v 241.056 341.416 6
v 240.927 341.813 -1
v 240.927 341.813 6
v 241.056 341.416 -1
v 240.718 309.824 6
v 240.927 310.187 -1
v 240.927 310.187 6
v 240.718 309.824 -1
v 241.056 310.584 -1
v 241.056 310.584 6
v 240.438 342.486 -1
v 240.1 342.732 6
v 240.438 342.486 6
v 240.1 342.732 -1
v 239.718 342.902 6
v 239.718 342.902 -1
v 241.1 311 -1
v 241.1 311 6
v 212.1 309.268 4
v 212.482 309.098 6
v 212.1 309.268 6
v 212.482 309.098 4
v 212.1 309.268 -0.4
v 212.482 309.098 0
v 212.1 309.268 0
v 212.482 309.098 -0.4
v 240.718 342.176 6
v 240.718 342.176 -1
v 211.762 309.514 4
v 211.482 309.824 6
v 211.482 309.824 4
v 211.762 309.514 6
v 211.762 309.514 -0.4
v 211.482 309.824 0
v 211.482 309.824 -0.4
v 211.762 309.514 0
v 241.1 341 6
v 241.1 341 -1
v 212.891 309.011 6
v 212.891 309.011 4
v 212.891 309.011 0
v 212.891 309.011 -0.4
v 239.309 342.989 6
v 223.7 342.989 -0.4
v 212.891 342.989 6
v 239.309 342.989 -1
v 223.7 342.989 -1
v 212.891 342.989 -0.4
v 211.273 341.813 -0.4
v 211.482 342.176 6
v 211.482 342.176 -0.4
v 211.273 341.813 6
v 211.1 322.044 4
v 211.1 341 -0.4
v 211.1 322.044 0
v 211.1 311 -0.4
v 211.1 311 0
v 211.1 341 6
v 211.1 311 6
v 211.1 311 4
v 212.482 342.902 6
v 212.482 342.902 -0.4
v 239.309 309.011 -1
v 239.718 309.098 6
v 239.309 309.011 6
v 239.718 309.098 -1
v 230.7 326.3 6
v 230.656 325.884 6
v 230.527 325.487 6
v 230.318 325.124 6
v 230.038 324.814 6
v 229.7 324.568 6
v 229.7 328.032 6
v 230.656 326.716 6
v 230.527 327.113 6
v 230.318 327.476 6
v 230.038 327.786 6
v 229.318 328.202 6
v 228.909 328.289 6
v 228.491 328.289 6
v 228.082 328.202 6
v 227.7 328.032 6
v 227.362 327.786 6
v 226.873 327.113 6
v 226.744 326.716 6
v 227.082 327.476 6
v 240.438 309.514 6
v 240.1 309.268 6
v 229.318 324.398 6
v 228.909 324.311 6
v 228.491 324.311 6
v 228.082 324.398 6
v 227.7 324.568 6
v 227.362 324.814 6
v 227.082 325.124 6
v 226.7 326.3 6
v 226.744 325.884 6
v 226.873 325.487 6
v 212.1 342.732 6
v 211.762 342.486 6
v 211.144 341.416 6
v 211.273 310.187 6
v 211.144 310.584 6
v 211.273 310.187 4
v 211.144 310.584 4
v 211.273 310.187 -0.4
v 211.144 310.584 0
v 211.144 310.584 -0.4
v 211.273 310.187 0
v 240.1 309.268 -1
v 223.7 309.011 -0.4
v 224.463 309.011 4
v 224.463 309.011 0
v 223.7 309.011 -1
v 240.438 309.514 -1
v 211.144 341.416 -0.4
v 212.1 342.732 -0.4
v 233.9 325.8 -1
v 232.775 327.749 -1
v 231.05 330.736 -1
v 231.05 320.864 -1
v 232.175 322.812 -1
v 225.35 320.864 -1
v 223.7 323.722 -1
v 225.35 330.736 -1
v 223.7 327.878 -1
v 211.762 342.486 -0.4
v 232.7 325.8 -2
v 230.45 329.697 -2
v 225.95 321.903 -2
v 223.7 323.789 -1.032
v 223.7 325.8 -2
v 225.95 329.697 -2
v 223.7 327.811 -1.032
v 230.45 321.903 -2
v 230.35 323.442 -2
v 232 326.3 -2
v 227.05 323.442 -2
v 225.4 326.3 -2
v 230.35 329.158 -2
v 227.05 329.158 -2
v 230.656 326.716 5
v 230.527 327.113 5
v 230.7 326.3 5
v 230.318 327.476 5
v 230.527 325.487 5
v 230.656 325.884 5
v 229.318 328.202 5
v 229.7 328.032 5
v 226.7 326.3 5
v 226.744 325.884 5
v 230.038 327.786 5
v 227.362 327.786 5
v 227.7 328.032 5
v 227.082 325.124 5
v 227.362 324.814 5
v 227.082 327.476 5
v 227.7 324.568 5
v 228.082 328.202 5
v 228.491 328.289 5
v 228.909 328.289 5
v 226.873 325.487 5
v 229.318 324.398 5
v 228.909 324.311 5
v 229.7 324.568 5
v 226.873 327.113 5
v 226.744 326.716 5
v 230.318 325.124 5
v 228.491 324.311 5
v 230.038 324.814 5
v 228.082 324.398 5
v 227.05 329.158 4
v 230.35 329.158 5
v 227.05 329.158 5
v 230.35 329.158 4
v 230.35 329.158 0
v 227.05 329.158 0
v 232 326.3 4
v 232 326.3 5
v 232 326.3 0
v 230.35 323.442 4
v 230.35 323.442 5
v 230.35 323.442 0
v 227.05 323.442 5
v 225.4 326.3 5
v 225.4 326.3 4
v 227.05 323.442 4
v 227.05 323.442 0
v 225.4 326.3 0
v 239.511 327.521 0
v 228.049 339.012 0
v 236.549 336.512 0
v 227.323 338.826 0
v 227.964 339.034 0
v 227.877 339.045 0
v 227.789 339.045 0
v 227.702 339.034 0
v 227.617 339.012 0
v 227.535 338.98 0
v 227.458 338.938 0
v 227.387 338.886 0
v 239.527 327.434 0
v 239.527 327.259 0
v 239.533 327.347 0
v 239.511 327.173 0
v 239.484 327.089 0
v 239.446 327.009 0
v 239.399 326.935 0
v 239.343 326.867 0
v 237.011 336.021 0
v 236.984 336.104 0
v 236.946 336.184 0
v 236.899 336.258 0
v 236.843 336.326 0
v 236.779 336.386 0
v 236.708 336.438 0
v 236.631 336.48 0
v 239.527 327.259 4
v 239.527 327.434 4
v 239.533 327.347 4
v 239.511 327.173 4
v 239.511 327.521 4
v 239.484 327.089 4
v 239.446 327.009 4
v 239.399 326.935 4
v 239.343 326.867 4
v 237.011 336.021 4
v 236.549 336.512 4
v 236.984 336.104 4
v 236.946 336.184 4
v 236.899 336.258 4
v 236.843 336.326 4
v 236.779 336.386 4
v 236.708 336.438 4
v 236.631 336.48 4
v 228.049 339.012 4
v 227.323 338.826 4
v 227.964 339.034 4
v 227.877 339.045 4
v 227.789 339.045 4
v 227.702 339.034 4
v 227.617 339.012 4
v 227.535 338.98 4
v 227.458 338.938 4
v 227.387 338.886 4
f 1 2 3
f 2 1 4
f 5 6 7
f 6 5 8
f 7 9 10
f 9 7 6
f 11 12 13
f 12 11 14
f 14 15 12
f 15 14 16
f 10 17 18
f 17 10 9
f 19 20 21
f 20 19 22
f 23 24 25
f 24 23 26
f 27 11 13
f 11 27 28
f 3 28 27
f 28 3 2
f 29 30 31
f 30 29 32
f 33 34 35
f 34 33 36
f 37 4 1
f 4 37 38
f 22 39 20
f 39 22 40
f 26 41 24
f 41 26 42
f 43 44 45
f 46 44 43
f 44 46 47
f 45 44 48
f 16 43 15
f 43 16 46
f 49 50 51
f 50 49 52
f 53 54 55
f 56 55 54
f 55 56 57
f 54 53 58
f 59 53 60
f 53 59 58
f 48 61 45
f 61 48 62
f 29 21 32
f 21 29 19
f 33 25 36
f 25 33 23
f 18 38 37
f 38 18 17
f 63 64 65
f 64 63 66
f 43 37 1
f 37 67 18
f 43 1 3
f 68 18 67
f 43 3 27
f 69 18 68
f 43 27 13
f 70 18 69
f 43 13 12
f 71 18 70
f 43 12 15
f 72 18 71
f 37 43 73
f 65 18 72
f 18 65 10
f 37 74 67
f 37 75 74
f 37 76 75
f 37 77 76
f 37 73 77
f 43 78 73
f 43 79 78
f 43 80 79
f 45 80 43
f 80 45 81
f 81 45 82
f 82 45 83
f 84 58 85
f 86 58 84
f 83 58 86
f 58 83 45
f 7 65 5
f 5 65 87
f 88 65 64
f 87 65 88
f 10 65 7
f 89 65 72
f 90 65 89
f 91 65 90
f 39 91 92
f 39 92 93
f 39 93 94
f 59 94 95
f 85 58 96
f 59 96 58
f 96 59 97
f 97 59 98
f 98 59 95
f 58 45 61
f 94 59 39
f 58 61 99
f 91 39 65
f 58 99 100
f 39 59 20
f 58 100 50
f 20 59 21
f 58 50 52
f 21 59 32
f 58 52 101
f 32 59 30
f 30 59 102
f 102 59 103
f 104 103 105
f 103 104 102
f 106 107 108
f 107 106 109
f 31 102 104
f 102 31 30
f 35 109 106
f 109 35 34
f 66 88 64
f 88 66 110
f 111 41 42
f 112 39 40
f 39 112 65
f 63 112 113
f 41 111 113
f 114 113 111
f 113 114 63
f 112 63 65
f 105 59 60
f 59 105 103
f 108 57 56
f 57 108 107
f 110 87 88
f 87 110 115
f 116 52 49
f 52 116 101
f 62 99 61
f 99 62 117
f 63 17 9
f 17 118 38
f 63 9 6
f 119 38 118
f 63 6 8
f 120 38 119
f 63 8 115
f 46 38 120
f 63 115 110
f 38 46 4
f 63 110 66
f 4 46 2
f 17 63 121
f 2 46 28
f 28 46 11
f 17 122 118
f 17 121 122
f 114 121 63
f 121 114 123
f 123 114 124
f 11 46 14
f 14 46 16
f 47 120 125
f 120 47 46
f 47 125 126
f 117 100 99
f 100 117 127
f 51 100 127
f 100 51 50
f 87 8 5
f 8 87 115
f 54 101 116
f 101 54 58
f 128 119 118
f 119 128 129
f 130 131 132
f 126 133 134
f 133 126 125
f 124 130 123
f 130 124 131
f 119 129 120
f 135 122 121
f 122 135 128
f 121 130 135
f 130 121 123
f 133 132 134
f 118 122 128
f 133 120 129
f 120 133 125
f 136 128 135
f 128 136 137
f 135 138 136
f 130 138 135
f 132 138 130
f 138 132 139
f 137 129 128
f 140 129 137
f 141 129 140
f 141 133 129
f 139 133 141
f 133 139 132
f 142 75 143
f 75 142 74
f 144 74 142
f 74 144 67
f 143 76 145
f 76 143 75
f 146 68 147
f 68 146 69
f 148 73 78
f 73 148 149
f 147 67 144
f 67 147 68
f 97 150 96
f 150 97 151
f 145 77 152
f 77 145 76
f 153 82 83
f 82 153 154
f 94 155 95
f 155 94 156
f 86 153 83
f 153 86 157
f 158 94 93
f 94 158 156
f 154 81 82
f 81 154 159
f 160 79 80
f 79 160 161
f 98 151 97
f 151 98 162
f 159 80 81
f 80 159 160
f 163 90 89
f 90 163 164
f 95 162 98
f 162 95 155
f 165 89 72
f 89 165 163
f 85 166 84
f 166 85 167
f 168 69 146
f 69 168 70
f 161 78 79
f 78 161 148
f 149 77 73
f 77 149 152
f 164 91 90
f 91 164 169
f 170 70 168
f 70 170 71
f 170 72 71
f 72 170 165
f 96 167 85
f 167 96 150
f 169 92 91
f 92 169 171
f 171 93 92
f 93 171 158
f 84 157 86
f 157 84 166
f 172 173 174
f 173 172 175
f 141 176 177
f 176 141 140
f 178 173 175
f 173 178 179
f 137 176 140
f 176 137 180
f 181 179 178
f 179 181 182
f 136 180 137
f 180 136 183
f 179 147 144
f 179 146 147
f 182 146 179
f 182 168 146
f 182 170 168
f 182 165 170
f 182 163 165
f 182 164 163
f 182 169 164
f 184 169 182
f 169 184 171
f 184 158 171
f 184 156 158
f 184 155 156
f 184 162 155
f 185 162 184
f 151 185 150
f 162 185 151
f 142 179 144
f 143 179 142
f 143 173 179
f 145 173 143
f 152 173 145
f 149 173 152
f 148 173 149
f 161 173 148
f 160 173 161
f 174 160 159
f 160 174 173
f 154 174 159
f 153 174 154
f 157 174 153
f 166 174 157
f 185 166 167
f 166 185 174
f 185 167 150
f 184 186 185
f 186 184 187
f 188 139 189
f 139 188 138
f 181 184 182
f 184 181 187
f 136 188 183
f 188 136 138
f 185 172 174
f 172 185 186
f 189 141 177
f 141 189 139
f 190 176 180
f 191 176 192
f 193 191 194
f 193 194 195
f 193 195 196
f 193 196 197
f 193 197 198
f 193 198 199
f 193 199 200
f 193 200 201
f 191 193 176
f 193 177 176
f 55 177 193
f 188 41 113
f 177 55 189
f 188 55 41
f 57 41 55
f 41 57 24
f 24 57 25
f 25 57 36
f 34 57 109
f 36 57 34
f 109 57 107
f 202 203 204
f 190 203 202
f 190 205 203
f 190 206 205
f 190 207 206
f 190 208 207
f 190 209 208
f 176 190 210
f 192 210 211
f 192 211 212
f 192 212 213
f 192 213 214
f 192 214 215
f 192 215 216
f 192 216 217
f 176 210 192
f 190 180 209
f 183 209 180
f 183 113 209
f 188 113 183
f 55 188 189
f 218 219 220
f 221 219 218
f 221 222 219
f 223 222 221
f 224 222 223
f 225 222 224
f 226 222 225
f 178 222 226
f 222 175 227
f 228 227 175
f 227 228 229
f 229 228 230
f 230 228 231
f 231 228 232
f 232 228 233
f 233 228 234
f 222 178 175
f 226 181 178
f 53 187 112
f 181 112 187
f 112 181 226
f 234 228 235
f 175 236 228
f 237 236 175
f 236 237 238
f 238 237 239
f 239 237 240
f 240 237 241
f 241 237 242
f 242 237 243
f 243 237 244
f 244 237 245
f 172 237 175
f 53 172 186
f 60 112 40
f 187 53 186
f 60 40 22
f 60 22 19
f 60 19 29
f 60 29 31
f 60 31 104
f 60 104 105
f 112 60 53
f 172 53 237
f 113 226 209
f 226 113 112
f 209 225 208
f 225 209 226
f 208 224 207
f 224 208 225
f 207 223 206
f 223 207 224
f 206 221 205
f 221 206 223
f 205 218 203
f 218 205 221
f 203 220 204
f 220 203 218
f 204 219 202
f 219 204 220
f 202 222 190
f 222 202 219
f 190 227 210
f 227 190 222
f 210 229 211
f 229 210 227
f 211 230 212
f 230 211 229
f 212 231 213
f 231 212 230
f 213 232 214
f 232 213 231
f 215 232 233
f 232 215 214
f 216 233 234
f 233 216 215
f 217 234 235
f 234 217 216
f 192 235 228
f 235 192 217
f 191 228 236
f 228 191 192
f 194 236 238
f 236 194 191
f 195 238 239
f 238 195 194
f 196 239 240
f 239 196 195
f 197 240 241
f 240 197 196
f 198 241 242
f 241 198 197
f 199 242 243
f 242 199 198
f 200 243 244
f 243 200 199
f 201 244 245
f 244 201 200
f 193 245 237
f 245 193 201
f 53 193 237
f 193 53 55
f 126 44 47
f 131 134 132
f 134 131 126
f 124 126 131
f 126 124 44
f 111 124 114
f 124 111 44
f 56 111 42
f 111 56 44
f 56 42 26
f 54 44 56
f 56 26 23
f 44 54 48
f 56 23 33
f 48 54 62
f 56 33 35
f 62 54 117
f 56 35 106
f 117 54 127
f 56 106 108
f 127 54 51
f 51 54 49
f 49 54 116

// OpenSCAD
module bed(buffer)
{
    linear_extrude(4)
    minkowski()
    {
        import("../doc/wilson-bed-2030-lc-nohole.dxf");
        circle(r=buffer,$fn=50);
    }
}

m3_nut_r = 6.6/2;
m3_slot=3.5;
//bed();
/*
difference()
{
//bottom left solid
    union()
    {
        translate([1.7+5+1.6+4,2,-.8])linear_extrude(7)minkowski()
        {
            square([26,30]);
            circle(r=2,$fn=30);
        }
        translate([20.2-.5,11.8-.5,-1])cylinder(r1=m3_nut_r+1.2,r2=m3_nut_r+3.6,h=2,center=true,$fn=6);
    }
//bottom_left hole
translate([20.2-.5,11.8-.5,0])cylinder(r=m3_slot/2+.25,h=20,center=true,$fn=30);
translate([20.2-.5,11.8-.5,0])cylinder(r=m3_nut_r,h=7,center=true,$fn=6);
translate([20.2+10+4.5,15,-3.4])cube([20,40,6],center=true);
bed(.3);
}
*/
/*
difference()
{
    //bottom right solid
    union()
    {
        translate([208+2.7-1.6,2,-1])linear_extrude(7)minkowski()
        {
            square([26,30]);
            circle(r=2,$fn=30);
        }
        translate([208+20.2+.5,11.8-.5,-1])cylinder(r1=m3_nut_r+1.2,r2=m3_nut_r+3.6,h=2,center=true,$fn=6);
    }

//bottom_right hole
translate([208+.5+20.2,11.8-.5,0])cylinder(r=m3_slot/2+.25,h=20,center=true,$fn=30);
translate([208+.5+20.2,11.8-.5,0])cylinder(r=m3_nut_r,h=7,center=true,$fn=6);
translate([208+20.2-10-4.5,15,-3.4])cube([20,40,6],center=true);
bed(.2);
}
*/
/*
difference()
{
    //top left solid

union()
    {
        translate([1.7+5+1.6+4-4,2+309,-1])linear_extrude(7)minkowski()
        {
            square([26,30]);
            circle(r=2,$fn=30);
        }
        translate([20.2,314+11.8,-1])cylinder(r1=m3_nut_r+1.2,r2=m3_nut_r+3.6,h=2,center=true,$fn=6);
    }
//top_left hole
translate([20.2-.5,314+.5+11.8,0])cylinder(r=m3_slot/2+.25,h=20,center=true,$fn=30);
translate([20.2-.5,314+.5+11.8,0])cylinder(r=m3_nut_r,h=7,center=true,$fn=6);
translate([20.2+10+4.5,314+15,-3.4])cube([20,40,6],center=true);
bed(.9);
}
*/

difference()
{
union()
    {
        translate([208+2.7-1.6+4,2+309,-1])linear_extrude(7)minkowski()
        {
            square([26,30]);
            circle(r=2,$fn=30);
        }
        translate([208+20.2,314+11.8,-1])cylinder(r1=m3_nut_r+1.2,r2=m3_nut_r+3.6,h=2,center=true,$fn=6);
    }

//top_right hole
    translate([208+.5+20.2,314+.5+11.8,0])cylinder(r=m3_slot/2+.25,h=20,center=true,$fn=30);
    translate([208+.5+20.2,314+.5+11.8,0])cylinder(r=m3_nut_r,h=10,center=true,$fn=6);
    bed(.7);
    translate([20.2-10-4.5+208,314+15,-3.4])cube([20,40,6],center=true);

}
